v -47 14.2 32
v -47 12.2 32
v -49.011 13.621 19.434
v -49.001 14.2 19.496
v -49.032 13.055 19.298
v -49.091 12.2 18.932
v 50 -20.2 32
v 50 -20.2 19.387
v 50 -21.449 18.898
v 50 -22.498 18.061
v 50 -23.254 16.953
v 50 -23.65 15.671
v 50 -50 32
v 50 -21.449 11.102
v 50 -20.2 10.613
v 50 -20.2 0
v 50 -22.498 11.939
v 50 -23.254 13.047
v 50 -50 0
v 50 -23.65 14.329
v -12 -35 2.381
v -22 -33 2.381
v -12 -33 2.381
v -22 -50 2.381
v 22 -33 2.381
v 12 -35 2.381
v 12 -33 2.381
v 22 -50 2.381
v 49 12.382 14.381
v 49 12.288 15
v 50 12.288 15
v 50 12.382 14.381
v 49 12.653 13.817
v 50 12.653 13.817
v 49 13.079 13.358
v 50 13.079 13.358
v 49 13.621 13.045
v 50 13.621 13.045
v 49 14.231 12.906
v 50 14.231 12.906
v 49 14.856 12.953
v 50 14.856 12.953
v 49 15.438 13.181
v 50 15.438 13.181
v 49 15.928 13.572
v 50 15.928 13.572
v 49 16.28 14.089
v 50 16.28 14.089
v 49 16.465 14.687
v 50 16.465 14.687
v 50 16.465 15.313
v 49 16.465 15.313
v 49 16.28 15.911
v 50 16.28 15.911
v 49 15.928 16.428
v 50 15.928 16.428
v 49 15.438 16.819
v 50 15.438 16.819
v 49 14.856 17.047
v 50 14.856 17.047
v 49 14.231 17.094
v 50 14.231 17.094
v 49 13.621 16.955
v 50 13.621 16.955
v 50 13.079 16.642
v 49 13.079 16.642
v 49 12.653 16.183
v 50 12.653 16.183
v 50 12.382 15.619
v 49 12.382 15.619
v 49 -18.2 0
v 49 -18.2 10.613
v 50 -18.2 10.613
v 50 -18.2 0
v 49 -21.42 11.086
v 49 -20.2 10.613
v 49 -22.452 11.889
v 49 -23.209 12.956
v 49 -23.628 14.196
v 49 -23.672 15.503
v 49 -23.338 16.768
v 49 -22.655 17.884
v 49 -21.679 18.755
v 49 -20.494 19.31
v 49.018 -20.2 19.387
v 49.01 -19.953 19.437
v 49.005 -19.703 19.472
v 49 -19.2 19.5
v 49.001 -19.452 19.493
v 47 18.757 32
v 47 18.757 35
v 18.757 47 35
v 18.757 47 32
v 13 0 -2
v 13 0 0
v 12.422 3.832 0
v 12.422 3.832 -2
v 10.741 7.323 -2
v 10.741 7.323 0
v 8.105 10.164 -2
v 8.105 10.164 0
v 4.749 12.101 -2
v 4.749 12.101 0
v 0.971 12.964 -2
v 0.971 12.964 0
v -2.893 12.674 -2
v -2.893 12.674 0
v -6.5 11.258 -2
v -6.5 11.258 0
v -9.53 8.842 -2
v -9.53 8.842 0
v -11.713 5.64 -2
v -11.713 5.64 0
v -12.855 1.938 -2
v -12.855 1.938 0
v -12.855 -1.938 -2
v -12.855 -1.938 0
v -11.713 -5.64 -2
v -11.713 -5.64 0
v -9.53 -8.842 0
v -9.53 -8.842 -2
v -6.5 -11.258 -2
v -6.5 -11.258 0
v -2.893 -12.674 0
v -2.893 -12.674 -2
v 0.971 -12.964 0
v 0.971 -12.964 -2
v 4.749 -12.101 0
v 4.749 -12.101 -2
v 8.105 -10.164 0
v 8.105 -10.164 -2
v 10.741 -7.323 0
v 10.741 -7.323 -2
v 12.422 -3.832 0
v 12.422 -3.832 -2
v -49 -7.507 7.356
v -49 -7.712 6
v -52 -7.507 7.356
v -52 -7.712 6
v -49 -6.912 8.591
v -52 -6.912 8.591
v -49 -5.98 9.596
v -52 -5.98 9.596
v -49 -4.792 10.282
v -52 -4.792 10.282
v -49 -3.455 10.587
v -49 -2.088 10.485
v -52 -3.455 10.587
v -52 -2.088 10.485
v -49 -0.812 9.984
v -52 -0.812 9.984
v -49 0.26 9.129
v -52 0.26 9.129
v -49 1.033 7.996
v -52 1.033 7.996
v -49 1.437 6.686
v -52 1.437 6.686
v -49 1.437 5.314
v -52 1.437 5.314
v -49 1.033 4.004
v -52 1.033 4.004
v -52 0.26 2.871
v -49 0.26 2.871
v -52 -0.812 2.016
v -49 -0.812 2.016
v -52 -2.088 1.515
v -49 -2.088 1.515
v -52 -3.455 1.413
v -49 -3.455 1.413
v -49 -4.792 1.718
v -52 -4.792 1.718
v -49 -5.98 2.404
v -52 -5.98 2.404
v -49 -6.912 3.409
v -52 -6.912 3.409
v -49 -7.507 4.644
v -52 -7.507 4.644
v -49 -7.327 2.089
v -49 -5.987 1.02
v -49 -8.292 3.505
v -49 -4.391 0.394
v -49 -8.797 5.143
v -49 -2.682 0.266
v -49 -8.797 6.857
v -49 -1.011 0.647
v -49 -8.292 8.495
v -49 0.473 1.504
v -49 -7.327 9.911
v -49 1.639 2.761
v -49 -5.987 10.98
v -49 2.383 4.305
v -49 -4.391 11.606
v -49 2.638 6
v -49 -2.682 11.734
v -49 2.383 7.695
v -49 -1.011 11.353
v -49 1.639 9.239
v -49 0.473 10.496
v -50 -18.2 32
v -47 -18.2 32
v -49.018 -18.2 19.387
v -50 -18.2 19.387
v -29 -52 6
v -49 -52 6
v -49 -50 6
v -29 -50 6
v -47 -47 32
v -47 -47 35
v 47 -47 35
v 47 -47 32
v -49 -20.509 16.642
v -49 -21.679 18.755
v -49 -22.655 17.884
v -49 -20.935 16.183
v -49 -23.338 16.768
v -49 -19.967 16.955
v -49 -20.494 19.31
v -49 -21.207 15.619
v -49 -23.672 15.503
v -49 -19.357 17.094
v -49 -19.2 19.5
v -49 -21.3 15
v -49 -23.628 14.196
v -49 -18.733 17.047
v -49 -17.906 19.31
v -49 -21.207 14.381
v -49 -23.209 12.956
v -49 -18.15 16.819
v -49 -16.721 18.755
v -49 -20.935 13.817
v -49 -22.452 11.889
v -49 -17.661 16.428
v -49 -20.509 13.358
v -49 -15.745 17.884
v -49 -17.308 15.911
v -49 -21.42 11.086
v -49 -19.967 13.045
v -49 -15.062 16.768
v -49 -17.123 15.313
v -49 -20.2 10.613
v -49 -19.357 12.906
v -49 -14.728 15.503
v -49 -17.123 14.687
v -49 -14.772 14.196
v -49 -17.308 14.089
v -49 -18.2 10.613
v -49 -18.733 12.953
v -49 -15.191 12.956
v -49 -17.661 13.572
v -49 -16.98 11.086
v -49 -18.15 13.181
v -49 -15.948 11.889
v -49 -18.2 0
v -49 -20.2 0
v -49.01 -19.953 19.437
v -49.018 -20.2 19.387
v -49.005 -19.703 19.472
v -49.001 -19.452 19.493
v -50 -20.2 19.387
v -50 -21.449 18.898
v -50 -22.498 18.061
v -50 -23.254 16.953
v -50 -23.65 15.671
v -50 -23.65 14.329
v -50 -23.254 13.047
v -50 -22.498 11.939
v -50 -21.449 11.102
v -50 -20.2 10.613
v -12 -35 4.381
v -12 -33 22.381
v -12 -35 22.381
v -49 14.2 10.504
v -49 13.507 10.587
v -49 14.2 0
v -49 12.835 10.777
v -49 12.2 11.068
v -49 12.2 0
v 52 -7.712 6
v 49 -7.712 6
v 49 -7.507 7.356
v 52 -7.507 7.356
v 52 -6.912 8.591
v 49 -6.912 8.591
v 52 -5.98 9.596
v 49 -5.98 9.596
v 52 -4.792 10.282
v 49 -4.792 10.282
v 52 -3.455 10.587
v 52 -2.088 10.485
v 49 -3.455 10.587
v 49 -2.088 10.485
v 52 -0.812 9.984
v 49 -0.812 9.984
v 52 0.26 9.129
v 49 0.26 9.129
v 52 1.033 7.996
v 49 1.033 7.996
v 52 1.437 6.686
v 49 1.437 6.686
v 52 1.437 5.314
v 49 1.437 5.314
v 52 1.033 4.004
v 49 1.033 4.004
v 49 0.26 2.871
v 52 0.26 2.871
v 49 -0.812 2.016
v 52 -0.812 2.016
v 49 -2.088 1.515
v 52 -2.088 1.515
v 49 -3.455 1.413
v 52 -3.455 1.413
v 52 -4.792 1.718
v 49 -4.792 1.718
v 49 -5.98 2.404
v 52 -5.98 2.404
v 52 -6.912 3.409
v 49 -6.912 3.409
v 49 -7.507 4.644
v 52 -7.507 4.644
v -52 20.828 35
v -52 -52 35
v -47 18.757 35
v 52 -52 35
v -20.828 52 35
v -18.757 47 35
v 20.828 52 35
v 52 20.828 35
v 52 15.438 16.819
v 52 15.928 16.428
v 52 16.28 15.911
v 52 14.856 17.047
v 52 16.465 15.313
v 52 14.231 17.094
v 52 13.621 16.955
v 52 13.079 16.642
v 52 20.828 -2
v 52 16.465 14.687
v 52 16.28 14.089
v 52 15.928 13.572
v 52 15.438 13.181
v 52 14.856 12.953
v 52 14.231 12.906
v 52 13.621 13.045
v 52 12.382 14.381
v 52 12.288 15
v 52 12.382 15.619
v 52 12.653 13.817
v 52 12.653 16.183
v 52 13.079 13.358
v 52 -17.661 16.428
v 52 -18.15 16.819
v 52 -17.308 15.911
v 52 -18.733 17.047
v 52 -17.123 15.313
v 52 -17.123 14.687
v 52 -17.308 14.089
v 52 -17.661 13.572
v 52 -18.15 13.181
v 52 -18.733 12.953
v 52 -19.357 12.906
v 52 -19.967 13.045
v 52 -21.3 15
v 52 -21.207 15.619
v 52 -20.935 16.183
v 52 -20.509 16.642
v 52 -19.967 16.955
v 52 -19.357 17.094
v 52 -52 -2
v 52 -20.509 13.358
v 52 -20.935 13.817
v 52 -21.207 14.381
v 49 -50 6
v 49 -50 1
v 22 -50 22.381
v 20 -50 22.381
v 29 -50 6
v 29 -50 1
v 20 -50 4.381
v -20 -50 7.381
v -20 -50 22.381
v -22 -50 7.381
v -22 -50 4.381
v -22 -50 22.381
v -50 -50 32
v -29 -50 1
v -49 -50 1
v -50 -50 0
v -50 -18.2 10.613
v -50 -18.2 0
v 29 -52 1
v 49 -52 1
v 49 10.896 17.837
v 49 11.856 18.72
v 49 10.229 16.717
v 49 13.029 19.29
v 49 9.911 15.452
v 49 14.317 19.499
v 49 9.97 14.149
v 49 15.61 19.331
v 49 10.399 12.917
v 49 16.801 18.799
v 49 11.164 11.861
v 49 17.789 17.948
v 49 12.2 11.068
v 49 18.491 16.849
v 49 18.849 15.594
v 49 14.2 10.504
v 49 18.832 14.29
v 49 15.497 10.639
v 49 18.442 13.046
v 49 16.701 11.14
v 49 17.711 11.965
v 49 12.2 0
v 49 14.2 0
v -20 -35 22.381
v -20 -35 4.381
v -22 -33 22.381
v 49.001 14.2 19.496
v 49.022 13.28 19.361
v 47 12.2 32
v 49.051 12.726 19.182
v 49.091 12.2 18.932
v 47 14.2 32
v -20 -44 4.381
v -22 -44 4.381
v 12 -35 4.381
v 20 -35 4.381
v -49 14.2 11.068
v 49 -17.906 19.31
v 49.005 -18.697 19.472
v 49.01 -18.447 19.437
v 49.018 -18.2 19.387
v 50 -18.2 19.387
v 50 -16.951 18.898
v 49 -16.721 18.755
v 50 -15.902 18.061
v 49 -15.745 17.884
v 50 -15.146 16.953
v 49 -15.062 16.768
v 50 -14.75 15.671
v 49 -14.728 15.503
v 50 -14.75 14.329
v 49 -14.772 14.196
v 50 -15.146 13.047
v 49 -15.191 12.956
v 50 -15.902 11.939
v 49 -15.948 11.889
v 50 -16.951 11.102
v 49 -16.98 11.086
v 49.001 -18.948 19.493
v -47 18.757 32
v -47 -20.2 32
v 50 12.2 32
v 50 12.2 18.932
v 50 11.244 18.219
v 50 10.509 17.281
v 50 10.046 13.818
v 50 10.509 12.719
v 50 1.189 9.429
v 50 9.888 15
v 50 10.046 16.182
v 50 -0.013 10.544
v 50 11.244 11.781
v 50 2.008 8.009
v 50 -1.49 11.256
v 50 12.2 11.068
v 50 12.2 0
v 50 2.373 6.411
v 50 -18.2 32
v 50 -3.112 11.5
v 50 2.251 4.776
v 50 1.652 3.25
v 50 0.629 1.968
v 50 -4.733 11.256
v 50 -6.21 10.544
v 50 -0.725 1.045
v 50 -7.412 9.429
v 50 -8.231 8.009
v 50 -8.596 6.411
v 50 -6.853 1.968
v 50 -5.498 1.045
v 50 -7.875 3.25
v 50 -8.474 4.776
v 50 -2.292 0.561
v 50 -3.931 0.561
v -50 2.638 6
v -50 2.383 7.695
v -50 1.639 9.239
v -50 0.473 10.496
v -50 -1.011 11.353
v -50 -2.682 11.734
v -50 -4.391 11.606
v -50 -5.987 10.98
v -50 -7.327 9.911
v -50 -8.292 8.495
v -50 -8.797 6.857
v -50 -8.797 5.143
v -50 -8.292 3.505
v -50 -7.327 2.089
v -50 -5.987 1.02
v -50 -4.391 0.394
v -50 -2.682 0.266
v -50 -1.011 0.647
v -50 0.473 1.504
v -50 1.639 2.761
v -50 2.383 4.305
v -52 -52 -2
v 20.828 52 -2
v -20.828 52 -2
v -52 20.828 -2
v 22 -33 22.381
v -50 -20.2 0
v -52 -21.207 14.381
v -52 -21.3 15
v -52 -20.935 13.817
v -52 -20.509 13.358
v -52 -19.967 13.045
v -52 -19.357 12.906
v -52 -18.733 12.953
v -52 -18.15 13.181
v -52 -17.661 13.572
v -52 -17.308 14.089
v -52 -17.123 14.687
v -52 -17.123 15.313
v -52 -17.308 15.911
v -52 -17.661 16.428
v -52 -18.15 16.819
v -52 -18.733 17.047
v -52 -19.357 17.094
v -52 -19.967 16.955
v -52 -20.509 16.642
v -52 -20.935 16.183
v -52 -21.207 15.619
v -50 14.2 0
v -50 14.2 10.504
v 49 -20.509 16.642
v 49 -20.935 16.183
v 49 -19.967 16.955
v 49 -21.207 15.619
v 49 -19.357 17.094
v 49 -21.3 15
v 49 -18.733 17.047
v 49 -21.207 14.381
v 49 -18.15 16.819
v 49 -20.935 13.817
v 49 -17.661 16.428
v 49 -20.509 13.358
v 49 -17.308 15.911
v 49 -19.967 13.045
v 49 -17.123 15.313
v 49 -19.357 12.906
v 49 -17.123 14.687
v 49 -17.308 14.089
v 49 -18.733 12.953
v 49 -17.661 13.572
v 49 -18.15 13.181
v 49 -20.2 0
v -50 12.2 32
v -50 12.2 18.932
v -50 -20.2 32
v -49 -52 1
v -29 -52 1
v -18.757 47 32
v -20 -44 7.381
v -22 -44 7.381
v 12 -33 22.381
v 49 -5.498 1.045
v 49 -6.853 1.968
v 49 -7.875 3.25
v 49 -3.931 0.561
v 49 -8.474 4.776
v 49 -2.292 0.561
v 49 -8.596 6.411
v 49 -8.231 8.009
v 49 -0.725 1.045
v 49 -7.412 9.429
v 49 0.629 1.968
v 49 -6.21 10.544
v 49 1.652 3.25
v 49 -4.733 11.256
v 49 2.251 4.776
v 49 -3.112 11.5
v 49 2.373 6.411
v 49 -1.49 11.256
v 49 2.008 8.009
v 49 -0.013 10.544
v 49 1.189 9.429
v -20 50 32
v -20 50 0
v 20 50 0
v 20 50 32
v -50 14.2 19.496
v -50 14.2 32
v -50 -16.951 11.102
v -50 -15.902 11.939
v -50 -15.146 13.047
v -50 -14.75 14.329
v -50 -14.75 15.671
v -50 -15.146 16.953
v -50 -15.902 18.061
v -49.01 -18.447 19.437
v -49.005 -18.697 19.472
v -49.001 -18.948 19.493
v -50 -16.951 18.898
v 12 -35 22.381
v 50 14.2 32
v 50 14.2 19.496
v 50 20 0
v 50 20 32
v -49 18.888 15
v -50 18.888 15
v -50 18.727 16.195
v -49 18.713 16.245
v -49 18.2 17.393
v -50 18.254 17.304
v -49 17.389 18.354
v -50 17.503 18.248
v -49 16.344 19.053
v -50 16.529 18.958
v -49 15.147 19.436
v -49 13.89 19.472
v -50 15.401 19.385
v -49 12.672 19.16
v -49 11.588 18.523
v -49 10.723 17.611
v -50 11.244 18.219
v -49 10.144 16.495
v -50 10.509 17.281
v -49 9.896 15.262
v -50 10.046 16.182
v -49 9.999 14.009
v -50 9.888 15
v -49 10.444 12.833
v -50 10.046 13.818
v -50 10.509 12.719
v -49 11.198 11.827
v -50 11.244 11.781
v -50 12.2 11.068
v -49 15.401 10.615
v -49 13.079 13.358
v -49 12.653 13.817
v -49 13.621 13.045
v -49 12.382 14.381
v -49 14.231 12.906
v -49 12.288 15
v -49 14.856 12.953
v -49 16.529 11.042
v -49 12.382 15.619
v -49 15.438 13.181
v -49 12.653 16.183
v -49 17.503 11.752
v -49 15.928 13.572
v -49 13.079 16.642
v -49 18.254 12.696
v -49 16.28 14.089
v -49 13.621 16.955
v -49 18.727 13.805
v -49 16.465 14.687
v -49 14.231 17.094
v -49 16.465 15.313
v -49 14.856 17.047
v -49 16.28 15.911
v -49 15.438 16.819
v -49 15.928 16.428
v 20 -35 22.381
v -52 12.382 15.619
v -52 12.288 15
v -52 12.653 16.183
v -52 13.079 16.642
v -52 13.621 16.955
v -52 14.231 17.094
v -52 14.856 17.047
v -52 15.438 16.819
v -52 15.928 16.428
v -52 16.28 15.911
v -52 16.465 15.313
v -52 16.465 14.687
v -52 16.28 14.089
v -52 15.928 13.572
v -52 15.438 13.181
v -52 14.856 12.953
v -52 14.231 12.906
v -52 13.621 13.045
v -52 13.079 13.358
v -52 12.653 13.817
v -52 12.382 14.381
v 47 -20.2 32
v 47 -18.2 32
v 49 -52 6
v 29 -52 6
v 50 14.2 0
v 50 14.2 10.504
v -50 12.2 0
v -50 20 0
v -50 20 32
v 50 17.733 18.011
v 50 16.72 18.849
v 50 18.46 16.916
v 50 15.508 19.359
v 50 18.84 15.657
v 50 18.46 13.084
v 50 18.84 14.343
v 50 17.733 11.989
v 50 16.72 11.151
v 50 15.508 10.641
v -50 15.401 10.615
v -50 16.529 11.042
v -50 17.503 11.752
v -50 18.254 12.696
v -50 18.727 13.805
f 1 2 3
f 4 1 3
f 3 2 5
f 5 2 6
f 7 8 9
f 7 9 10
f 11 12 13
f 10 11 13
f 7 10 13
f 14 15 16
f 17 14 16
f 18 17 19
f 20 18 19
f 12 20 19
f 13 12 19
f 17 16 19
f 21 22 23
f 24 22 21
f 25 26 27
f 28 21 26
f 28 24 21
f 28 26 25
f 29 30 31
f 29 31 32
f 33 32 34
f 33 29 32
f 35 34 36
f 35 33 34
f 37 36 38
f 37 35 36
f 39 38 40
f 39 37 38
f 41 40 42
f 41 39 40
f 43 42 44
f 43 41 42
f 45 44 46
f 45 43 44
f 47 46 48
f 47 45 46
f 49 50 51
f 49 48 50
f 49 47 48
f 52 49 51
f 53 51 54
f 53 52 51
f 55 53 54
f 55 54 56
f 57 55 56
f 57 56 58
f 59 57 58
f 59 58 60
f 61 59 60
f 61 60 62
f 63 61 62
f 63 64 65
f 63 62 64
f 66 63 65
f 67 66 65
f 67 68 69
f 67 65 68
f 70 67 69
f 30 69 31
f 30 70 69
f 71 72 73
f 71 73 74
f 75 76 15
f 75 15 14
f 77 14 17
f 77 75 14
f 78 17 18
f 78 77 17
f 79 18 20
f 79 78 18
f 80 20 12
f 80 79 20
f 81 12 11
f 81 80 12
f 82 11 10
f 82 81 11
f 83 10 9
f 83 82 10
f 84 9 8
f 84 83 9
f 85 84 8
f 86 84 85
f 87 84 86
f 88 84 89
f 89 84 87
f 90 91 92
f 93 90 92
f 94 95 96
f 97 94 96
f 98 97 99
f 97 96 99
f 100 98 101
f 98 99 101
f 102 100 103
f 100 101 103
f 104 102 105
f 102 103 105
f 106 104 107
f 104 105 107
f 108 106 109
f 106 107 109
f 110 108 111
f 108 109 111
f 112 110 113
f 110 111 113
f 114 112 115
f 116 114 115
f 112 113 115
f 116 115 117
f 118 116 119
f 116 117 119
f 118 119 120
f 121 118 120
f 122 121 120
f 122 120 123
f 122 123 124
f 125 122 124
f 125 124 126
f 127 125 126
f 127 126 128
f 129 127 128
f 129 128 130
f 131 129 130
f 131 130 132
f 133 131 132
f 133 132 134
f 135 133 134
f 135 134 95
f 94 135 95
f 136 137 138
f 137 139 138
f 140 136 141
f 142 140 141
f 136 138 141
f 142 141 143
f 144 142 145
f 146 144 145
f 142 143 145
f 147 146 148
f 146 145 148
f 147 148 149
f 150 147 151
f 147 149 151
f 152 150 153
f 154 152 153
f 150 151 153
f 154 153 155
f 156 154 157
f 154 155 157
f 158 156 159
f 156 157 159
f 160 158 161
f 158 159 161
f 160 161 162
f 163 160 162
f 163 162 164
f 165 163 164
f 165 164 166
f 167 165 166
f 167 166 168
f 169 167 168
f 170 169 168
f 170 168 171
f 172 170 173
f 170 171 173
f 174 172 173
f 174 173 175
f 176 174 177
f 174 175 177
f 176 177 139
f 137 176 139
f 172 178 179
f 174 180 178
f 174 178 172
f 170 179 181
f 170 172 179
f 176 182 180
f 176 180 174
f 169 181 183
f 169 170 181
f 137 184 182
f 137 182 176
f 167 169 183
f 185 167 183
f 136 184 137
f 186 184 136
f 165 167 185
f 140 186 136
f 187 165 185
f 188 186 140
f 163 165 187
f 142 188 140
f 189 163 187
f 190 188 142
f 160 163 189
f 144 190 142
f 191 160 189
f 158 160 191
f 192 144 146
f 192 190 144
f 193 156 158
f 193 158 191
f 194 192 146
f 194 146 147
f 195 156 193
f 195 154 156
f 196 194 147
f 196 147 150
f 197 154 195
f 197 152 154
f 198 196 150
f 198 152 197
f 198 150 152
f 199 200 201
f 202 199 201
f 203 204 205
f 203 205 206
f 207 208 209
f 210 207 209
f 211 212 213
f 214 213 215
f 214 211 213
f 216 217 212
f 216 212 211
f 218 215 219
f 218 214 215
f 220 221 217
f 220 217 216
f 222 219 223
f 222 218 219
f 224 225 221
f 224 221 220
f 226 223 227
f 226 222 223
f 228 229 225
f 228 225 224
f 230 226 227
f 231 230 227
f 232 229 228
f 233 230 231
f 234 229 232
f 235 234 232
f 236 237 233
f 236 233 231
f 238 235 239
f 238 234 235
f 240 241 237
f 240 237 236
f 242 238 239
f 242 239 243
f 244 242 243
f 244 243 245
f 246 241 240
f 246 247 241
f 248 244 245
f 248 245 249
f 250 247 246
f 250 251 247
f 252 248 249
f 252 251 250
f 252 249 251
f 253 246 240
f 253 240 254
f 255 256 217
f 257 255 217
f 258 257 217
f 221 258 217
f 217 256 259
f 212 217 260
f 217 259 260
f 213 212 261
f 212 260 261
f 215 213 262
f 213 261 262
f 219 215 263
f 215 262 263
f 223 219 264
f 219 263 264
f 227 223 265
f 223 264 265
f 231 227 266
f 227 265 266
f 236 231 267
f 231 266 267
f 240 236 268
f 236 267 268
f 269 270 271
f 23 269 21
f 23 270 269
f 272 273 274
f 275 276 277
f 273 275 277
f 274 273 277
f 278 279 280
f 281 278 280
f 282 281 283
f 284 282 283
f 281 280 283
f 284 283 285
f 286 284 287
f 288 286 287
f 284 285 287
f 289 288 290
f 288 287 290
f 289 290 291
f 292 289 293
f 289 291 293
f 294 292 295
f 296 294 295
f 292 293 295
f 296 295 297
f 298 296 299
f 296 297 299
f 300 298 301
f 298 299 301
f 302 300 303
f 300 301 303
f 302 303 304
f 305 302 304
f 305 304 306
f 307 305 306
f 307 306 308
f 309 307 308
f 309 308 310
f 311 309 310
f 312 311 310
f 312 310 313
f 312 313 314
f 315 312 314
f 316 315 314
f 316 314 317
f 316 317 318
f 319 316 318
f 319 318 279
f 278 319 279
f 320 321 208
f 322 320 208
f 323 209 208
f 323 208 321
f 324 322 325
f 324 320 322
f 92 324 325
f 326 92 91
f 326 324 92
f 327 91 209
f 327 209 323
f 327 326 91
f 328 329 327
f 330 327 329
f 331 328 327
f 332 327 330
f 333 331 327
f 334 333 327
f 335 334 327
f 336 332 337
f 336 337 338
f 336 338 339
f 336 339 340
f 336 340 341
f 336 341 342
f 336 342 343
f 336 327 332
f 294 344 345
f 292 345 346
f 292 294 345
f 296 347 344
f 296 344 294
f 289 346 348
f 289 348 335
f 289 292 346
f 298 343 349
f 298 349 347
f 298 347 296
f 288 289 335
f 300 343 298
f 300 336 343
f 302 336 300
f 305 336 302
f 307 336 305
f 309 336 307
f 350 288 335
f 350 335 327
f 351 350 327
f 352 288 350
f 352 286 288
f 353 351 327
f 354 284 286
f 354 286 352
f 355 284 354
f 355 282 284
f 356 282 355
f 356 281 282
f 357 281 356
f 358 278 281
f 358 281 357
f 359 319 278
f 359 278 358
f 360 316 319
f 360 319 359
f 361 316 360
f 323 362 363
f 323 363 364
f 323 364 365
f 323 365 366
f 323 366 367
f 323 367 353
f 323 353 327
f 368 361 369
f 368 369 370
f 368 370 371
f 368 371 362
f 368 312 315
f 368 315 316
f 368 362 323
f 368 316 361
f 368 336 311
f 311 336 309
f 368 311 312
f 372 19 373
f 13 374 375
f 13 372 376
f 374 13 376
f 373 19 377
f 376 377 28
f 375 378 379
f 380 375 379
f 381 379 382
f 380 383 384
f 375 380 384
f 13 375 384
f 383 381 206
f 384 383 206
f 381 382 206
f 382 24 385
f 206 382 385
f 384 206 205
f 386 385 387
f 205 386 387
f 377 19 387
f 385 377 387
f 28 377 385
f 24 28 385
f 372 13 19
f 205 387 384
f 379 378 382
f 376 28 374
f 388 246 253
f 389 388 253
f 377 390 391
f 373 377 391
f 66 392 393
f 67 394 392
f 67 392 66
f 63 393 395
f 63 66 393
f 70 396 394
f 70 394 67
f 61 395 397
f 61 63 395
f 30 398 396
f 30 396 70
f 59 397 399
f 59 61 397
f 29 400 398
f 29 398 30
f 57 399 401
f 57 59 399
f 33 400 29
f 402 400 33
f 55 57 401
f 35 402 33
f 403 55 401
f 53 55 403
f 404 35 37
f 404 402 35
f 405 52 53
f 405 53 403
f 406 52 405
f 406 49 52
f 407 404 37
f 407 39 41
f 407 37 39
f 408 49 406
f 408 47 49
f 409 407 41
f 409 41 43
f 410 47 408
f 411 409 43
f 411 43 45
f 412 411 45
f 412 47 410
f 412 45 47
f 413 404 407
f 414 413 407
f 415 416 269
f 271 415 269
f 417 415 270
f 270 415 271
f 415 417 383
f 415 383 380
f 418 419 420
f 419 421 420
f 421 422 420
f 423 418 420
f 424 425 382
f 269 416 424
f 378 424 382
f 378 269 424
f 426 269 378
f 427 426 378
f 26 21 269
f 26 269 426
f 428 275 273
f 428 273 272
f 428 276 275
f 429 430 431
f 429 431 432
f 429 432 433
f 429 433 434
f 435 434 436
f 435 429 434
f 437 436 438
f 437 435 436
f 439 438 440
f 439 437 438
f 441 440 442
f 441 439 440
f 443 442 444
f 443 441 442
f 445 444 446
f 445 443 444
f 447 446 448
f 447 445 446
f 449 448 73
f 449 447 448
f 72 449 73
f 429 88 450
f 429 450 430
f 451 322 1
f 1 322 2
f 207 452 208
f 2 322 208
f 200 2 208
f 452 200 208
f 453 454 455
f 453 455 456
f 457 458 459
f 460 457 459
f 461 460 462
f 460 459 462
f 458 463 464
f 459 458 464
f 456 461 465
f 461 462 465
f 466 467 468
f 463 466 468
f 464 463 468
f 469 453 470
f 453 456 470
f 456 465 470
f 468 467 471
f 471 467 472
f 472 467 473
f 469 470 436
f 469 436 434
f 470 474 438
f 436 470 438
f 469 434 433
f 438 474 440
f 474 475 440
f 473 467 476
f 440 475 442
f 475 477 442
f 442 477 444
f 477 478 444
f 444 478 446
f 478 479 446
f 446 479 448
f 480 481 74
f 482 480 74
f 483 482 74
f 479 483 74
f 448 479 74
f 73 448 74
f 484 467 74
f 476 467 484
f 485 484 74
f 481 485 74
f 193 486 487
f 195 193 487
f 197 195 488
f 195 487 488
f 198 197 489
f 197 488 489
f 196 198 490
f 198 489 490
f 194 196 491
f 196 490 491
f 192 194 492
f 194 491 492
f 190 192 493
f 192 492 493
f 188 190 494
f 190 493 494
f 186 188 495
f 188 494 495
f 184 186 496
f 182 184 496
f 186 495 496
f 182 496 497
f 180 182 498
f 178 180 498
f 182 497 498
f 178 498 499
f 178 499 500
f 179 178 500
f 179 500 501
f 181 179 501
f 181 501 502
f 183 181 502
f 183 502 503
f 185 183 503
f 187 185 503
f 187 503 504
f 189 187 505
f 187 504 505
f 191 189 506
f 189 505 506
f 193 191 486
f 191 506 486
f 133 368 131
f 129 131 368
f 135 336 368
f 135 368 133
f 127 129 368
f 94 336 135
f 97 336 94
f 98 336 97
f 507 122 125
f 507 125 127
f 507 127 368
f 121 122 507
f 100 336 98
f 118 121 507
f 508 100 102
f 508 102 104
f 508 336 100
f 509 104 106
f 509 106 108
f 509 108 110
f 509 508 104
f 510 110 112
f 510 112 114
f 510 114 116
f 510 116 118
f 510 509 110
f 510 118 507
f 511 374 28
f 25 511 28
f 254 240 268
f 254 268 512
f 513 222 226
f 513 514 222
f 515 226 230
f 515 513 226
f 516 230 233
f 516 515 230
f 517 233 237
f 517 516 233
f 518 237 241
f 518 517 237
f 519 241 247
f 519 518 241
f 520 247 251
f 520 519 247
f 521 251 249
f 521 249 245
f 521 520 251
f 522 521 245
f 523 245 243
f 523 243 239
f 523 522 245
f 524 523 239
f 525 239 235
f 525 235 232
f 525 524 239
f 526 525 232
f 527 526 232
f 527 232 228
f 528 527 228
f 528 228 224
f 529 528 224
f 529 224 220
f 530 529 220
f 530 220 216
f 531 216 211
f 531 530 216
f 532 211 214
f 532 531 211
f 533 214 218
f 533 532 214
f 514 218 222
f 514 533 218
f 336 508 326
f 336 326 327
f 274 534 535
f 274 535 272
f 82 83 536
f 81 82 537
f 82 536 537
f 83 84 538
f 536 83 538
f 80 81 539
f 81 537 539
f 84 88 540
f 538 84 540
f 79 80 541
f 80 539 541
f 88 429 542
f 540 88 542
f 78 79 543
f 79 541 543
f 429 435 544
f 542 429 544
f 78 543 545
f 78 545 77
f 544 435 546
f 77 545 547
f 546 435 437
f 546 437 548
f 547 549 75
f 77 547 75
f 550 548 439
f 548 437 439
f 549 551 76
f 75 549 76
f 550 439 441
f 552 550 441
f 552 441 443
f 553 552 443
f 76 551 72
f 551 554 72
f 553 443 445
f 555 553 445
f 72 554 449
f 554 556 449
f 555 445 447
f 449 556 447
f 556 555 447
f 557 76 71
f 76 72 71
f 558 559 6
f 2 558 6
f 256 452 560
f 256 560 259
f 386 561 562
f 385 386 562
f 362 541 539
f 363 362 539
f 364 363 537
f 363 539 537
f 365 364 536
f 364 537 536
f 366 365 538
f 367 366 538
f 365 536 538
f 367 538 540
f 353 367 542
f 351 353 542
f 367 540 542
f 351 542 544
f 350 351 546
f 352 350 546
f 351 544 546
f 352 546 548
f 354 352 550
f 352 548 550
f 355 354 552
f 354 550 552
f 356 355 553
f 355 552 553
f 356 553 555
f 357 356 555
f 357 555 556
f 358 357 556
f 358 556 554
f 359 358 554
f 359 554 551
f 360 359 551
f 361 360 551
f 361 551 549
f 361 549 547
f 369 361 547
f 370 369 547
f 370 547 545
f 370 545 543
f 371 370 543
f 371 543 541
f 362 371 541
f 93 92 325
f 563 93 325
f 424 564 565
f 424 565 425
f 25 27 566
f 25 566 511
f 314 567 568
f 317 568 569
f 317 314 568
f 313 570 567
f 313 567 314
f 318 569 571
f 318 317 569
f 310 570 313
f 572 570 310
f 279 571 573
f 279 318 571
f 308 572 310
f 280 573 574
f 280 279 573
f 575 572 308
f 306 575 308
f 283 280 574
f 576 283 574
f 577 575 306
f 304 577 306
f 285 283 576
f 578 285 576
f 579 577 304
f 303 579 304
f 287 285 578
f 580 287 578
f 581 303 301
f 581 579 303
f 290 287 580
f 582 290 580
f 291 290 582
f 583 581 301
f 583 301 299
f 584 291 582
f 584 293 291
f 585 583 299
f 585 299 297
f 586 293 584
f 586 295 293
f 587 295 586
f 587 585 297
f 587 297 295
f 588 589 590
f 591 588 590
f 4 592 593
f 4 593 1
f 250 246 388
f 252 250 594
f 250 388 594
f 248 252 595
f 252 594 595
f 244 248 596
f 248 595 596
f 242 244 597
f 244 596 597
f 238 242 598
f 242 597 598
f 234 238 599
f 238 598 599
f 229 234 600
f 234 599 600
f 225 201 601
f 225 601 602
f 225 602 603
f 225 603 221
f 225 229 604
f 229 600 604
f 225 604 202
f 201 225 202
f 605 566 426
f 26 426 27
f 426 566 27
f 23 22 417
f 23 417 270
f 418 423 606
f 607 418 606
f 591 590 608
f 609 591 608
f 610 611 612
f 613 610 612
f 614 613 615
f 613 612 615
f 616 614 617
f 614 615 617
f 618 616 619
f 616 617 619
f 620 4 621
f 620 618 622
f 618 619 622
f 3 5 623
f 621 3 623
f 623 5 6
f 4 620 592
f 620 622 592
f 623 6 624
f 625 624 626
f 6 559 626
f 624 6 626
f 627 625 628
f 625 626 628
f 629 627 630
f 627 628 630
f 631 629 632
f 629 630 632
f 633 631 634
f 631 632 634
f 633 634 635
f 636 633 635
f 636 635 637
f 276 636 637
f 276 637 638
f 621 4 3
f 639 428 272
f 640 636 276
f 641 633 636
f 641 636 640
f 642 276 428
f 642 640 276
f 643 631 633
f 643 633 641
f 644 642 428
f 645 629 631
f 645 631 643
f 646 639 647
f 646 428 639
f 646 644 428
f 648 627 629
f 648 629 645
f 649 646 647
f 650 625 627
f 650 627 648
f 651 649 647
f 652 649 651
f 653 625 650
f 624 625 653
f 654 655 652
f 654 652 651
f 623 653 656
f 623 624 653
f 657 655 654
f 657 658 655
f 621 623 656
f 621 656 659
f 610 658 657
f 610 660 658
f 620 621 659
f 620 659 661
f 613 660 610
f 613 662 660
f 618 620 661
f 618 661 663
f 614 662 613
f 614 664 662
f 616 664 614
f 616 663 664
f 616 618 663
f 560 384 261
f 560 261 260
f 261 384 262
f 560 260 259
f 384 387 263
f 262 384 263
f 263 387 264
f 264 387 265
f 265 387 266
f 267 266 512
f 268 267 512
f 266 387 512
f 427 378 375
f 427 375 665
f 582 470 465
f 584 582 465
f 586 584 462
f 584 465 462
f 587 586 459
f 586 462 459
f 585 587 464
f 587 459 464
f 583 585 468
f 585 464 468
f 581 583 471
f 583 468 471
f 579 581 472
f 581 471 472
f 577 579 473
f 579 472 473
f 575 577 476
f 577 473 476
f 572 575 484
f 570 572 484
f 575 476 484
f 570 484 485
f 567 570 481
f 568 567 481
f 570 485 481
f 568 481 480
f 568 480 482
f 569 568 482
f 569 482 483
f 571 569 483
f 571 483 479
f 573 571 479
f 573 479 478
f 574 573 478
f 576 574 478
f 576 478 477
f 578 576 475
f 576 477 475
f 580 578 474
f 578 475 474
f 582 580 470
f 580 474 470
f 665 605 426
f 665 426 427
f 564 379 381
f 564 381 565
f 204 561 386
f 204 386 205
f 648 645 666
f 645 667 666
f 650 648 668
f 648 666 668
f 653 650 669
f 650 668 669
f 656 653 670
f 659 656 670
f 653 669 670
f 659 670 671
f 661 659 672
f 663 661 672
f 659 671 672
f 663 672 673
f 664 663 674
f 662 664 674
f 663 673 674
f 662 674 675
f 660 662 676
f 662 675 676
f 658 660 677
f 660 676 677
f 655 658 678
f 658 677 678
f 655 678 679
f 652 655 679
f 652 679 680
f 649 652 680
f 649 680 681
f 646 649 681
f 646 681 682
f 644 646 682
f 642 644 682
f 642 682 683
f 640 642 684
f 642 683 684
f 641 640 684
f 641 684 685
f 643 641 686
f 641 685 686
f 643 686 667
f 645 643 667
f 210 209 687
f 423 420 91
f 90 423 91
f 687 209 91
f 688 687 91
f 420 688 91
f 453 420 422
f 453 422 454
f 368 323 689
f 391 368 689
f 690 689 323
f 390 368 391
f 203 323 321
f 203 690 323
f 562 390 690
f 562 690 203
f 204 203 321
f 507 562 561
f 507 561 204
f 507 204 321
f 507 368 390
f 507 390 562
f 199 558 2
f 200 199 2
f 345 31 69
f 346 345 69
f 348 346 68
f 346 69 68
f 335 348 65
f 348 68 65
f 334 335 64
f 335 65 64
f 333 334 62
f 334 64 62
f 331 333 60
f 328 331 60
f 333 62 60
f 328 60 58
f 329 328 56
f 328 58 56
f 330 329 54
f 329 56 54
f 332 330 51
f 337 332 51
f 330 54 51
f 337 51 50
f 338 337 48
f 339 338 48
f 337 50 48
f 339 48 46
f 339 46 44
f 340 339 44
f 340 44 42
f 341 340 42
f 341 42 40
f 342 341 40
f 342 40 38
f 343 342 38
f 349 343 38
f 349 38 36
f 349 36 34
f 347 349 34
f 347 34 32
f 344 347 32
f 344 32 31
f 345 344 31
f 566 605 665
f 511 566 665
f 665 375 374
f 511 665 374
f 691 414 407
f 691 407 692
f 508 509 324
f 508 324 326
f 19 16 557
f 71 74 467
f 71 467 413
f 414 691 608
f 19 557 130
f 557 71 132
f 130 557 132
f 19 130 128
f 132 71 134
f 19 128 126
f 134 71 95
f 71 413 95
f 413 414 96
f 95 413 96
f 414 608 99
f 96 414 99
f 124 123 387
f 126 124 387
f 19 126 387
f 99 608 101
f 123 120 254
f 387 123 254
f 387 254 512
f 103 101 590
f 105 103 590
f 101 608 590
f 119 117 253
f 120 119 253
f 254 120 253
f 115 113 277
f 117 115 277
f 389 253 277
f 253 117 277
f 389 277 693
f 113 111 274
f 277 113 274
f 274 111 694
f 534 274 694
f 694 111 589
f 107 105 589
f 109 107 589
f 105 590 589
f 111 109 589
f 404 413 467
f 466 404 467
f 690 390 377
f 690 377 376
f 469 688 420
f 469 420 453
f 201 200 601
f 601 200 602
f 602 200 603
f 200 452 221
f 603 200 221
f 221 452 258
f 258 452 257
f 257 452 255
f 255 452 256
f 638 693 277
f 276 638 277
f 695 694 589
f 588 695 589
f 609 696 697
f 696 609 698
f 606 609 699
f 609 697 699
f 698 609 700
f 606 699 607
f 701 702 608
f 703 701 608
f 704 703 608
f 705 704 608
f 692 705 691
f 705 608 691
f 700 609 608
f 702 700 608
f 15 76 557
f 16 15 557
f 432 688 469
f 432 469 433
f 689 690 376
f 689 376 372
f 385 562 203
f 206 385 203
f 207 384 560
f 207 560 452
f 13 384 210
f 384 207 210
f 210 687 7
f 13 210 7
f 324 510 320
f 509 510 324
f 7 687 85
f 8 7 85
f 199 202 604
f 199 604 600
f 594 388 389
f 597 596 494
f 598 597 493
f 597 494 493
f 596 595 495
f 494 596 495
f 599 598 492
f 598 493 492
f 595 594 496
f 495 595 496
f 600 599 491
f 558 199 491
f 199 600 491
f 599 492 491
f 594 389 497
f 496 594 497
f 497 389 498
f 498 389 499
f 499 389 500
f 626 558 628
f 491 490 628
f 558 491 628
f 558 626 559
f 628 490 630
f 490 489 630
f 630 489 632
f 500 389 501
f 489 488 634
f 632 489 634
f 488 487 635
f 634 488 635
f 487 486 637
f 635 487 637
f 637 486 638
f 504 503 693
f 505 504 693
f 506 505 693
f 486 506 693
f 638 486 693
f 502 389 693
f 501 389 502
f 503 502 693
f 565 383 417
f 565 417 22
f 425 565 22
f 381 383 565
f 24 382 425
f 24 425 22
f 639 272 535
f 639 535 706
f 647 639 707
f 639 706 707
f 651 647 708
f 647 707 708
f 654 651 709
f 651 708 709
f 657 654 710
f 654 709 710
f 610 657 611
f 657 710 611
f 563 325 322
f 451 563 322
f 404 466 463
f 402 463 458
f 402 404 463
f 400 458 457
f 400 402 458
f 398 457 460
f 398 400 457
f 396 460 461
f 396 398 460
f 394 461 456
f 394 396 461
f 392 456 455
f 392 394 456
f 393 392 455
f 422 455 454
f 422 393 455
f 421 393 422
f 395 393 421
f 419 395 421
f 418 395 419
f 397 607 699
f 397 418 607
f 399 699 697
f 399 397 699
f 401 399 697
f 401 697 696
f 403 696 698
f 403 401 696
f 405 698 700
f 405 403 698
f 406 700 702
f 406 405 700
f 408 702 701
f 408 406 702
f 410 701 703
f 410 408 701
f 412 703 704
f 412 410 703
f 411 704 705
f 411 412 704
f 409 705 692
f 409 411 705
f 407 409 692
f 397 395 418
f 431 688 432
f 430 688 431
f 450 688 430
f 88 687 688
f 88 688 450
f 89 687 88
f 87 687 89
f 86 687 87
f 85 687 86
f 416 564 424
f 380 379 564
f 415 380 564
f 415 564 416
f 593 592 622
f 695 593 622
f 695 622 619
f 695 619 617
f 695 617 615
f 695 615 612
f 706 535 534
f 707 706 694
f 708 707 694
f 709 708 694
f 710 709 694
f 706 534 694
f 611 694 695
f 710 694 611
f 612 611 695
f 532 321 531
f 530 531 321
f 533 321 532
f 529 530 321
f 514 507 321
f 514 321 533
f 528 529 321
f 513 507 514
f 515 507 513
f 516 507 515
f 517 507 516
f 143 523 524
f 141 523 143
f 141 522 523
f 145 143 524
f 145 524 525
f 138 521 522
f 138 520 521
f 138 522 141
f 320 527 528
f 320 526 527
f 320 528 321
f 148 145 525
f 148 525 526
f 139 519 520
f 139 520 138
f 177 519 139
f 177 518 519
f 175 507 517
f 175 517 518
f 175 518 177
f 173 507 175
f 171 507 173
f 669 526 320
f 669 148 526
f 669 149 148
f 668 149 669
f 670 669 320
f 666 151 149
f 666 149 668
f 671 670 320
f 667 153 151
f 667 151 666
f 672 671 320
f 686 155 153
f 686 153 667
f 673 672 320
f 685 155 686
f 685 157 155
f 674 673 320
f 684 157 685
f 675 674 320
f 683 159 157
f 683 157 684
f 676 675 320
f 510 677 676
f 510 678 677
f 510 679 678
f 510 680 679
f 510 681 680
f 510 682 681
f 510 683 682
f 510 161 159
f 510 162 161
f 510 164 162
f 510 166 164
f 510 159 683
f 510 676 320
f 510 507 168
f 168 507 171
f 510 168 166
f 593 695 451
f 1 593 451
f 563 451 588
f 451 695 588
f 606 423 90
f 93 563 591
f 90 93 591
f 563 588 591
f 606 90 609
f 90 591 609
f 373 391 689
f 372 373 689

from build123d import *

# Parameters (mm, degrees)
BOSS_EXTRU_1_DEPTH       = 35
COQUE3_T                 = 2
ESQUISSE3_R              = 13
ENL_V_MAT_EXTRU_1_DEPTH  = 82.443231763
ESQUISSE5_W              = 20
ESQUISSE5_H              = 5
ENL_V_MAT_EXTRU_3_DEPTH  = 2
ESQUISSE6_R              = 4.6
ENL_V_MAT_EXTRU_4_DEPTH  = 122.428991596
ESQUISSE7_R              = 2.1
ENL_V_MAT_EXTRU_5_DEPTH  = 122.428991596
ESQUISSE8_W              = 44
ESQUISSE8_H              = 20
BOSS_EXTRU_2_DEPTH       = 17
ESQUISSE9_W              = 40
ESQUISSE9_H              = 15
ENL_V_MAT_EXTRU_7_DEPTH  = 18
ESQUISSE10_W             = 3
ESQUISSE10_H             = 6
ENL_V_MAT_EXTRU_8_DEPTH  = 5
BOSS_EXTRU_4_DEPTH       = 3
ESQUISSE22_R             = 4.5
BOSS_EXTRU_7_DEPTH       = 1
ENL_V_START              = -3
ESQUISSE24_R             = 2.1
ENL_V_MAT_EXTRU_12_DEPTH = 3
ESQUISSE20_R             = 4.5
BOSS_EXTRU_8_DEPTH       = 1
ESQUISSE25_R             = 2.1
ENL_V_MAT_EXTRU_13_DEPTH = 3
BOSS_EXTRU_9_START       = 1
ESQUISSE26_R             = 4.5
BOSS_EXTRU_9_DEPTH       = 1
ESQUISSE27_R             = 2.1
ENL_V_MAT_EXTRU_14_DEPTH = 3
BOSS_EXTRU_10_START      = 1
ESQUISSE28_R             = 4.5
BOSS_EXTRU_10_DEPTH      = 1
ESQUISSE29_R             = 2.1
ENL_V_MAT_EXTRU_15_DEPTH = 3
ESQUISSE34_R             = 5.75
BOSS_EXTRU_16_DEPTH      = 1
ESQUISSE35_R             = 4.6
ENL_V_MAT_EXTRU_19_DEPTH = 1
ESQUISSE36_R             = 5.5
BOSS_EXTRU_17_DEPTH      = 1
ESQUISSE37_R             = 4.6
ENL_V_MAT_EXTRU_20_DEPTH = 1
NERVURE3_REACH           = 96.86
ESQUISSE38_WALL_W        = 204.379203954
ESQUISSE38_WALL_H        = 2
NERVURE4_REACH           = 120.87
ESQUISSE39_WALLS_W       = 252.639353074
ESQUISSE39_WALLS_H       = 2
ESQUISSE40_W             = 24
ESQUISSE40_H             = 20
ENL_V_MAT_EXTRU_21_DEPTH = 2
SYM_TRIE2_START          = 12.2
SYM_TRIE2_OUTLINE_W      = 1
SYM_TRIE2_OUTLINE_H      = 11.067979308
SYM_TRIE2_DEPTH          = 2


with BuildPart() as part:
    # Esquisse1 → Boss.-Extru.1 (new body)
    with BuildSketch(Plane.XY):
        Polygon((-50, 20), (-20, 50), (20, 50), (50, 20), (50, -50), (-50, -50), align=None)
    extrude(amount=BOSS_EXTRU_1_DEPTH)

    # Coque3
    coque3_openings = [part.faces().sort_by_distance(p)[0] for p in [
        (0, -3.956043956, 35),
    ]]
    offset(amount=COQUE3_T, openings=coque3_openings, kind=Kind.INTERSECTION)

    # Esquisse3 → Enlèv. mat.-Extru.1 (cut, through all)
    with BuildSketch(Plane.XY):
        Circle(ESQUISSE3_R)
    extrude(amount=-ENL_V_MAT_EXTRU_1_DEPTH, mode=Mode.SUBTRACT)

    # Esquisse5 → Enlèv. mat.-Extru.3 (cut)
    with BuildSketch(Plane.XZ.offset(52)):
        with Locations((39, 3.5)):
            Rectangle(ESQUISSE5_W, ESQUISSE5_H)
        with Locations((-39, 3.5)):
            Rectangle(ESQUISSE5_W, ESQUISSE5_H)
    extrude(amount=-ENL_V_MAT_EXTRU_3_DEPTH, mode=Mode.SUBTRACT)

    # Esquisse6 → Enlèv. mat.-Extru.4 (cut, through all)
    with BuildSketch(Plane.ZY.offset(52)):
        with Locations(Location((6, -3.111572875, 0), (0, 0, 270))):
            Circle(ESQUISSE6_R)
    extrude(amount=-ENL_V_MAT_EXTRU_4_DEPTH, mode=Mode.SUBTRACT)

    # Esquisse7 → Enlèv. mat.-Extru.5 (cut, through all)
    with BuildSketch(Plane.ZY.offset(52)):
        with Locations(Location((15, 14.388427125, 0), (0, 0, 270))):
            Circle(ESQUISSE7_R)
        with Locations(Location((15, -19.2, 0), (0, 0, 270))):
            Circle(ESQUISSE7_R)
    extrude(amount=-ENL_V_MAT_EXTRU_5_DEPTH, mode=Mode.SUBTRACT)

    # Esquisse8 → Boss.-Extru.2 (add)
    with BuildSketch(Plane(origin=(0, -50, 0), x_dir=(1, 0, 0), z_dir=(0, 1, 0))):
        with Locations((0, -12.381067223)):
            Rectangle(ESQUISSE8_W, ESQUISSE8_H)
    extrude(amount=BOSS_EXTRU_2_DEPTH)

    # Esquisse9 → Enlèv. mat.-Extru.7 (cut)
    with BuildSketch(Plane.XY.offset(22.381067223)):
        with Locations((0, -42.5)):
            Rectangle(ESQUISSE9_W, ESQUISSE9_H)
    extrude(amount=-ENL_V_MAT_EXTRU_7_DEPTH, mode=Mode.SUBTRACT)

    # Esquisse10 → Enlèv. mat.-Extru.8 (cut)
    with BuildSketch(Plane(origin=(-20, 0, 0), x_dir=(0, 0, -1), z_dir=(1, 0, 0))):
        with Locations((-5.881067223, -47)):
            Rectangle(ESQUISSE10_W, ESQUISSE10_H)
    extrude(amount=-ENL_V_MAT_EXTRU_8_DEPTH, mode=Mode.SUBTRACT)

    # Esquisse17 → Boss.-Extru.4 (add)
    with BuildSketch(Plane.XY.offset(35)):
        Polygon((50, -50), (50, 20), (20, 50), (-20, 50), (-50, 20), (-50, -50), align=None)
        Polygon((-47, -47), (47, -47), (47, 18.757359313), (18.757359313, 47), (-18.757359313, 47), (-47, 18.757359313), align=None, mode=Mode.SUBTRACT)
    extrude(amount=-BOSS_EXTRU_4_DEPTH)

    # Esquisse22 → Boss.-Extru.7 (add)
    with BuildSketch(Plane(origin=(-50, 0, 0), x_dir=(0, 0, -1), z_dir=(1, 0, 0))):
        with Locations(Location((-15, -19.2, 0), (0, 0, 90))):
            Circle(ESQUISSE22_R)
    extrude(amount=BOSS_EXTRU_7_DEPTH)

    # Esquisse24 → Enlèv. mat.-Extru.12 (cut)
    with BuildSketch(Plane(origin=(-49, 0, 0), x_dir=(0, 0, -1), z_dir=(1, 0, 0)).offset(ENL_V_START)):
        with Locations(Location((-15, -19.2, 0), (0, 0, 270))):
            Circle(ESQUISSE24_R)
    extrude(amount=ENL_V_MAT_EXTRU_12_DEPTH, mode=Mode.SUBTRACT)

    # Esquisse20 → Boss.-Extru.8 (add)
    with BuildSketch(Plane(origin=(-50, 0, 0), x_dir=(0, 0, -1), z_dir=(1, 0, 0))):
        with Locations(Location((-15, 14.388427125, 0), (0, 0, 90))):
            Circle(ESQUISSE20_R)
    extrude(amount=BOSS_EXTRU_8_DEPTH)

    # Esquisse25 → Enlèv. mat.-Extru.13 (cut)
    with BuildSketch(Plane.ZY.offset(50)):
        with Locations(Location((15, 14.388427125, 0), (0, 0, 270))):
            Circle(ESQUISSE25_R)
    extrude(amount=-ENL_V_MAT_EXTRU_13_DEPTH, mode=Mode.SUBTRACT)

    # Esquisse26 → Boss.-Extru.9 (add)
    with BuildSketch(Plane.ZY.offset(-50).offset(BOSS_EXTRU_9_START)):
        with Locations(Location((15, 14.388427125, 0), (0, 0, 90))):
            Circle(ESQUISSE26_R)
    extrude(amount=-BOSS_EXTRU_9_DEPTH)

    # Esquisse27 → Enlèv. mat.-Extru.14 (cut)
    with BuildSketch(Plane(origin=(50, 0, 0), x_dir=(0, 0, -1), z_dir=(1, 0, 0)).offset(ENL_V_START)):
        with Locations(Location((-15, 14.388427125, 0), (0, 0, 270))):
            Circle(ESQUISSE27_R)
    extrude(amount=ENL_V_MAT_EXTRU_14_DEPTH, mode=Mode.SUBTRACT)

    # Esquisse28 → Boss.-Extru.10 (add)
    with BuildSketch(Plane.ZY.offset(-50).offset(BOSS_EXTRU_10_START)):
        with Locations(Location((15, -19.2, 0), (0, 0, 90))):
            Circle(ESQUISSE28_R)
    extrude(amount=-BOSS_EXTRU_10_DEPTH)

    # Esquisse29 → Enlèv. mat.-Extru.15 (cut)
    with BuildSketch(Plane.ZY.offset(-49)):
        with Locations(Location((15, -19.2, 0), (0, 0, 270))):
            Circle(ESQUISSE29_R)
    extrude(amount=-ENL_V_MAT_EXTRU_15_DEPTH, mode=Mode.SUBTRACT)

    # Esquisse34 → Boss.-Extru.16 (add)
    with BuildSketch(Plane(origin=(-50, 0, 0), x_dir=(0, 0, -1), z_dir=(1, 0, 0))):
        with Locations(Location((-6, -3.111572875, 0), (0, 0, 90))):
            Circle(ESQUISSE34_R)
    extrude(amount=BOSS_EXTRU_16_DEPTH)

    # Esquisse35 → Enlèv. mat.-Extru.19 (cut)
    with BuildSketch(Plane.ZY.offset(50)):
        with Locations(Location((6, -3.111572875, 0), (0, 0, 270))):
            Circle(ESQUISSE35_R)
    extrude(amount=-ENL_V_MAT_EXTRU_19_DEPTH, mode=Mode.SUBTRACT)

    # Esquisse36 → Boss.-Extru.17 (add)
    with BuildSketch(Plane.ZY.offset(-50)):
        with Locations((6, -3.111572875)):
            Circle(ESQUISSE36_R)
    extrude(amount=BOSS_EXTRU_17_DEPTH)

    # Esquisse37 → Enlèv. mat.-Extru.20 (cut)
    with BuildSketch(Plane.ZY.offset(-49)):
        with Locations(Location((6, -3.111572875, 0), (0, 0, 270))):
            Circle(ESQUISSE37_R)
    extrude(amount=-ENL_V_MAT_EXTRU_20_DEPTH, mode=Mode.SUBTRACT)

    # Esquisse38 wall → Nervure3 (add, up to next)
    with BuildSketch(Plane(origin=(-48, -19.2, 25.75), x_dir=(-0.157990501107, 0, -0.987440631917), z_dir=(-0.987440631917, 0, 0.157990501107)), mode=Mode.PRIVATE) as nervure3_sk1:
        Rectangle(ESQUISSE38_WALL_W, ESQUISSE38_WALL_H)
    nervure3_tool1 = extrude(nervure3_sk1.sketch, amount=NERVURE3_REACH, mode=Mode.PRIVATE) - part.part
    nervure3 = nervure3_tool1.solids().sort_by_distance((-48, -19.2, 25.75))[0]
    add(nervure3)

    # Esquisse39 walls → Nervure4 (add, up to next)
    with BuildSketch(Plane(origin=(-49, 0, 0), x_dir=(0, 0, -1), z_dir=(1, 0, 0)), mode=Mode.PRIVATE) as nervure4_sk1:
        with Locations((-6.45, -19.2)):
            Rectangle(ESQUISSE39_WALLS_W, ESQUISSE39_WALLS_H)
    nervure4_tool1 = extrude(nervure4_sk1.sketch, amount=-NERVURE4_REACH, mode=Mode.PRIVATE) - part.part
    nervure4 = nervure4_tool1.solids().sort_by_distance((-49, -19.2, 6.45))[0]
    add(nervure4)

    # Esquisse40 → Enlèv. mat.-Extru.21 (cut)
    with BuildSketch(Plane(origin=(0, -33, 0), x_dir=(1, 0, 0), z_dir=(0, 1, 0))):
        with Locations((0, -12.381067223)):
            Rectangle(ESQUISSE40_W, ESQUISSE40_H)
    extrude(amount=-ENL_V_MAT_EXTRU_21_DEPTH, mode=Mode.SUBTRACT)

    # Symétrie1: Nervure3, Nervure4 across plane
    add(nervure3.mirror(Plane(origin=(0, 0, 0), x_dir=(0, 0, 1), z_dir=(1, 0, 0))))
    add(nervure4.mirror(Plane(origin=(0, 0, 0), x_dir=(0, 0, 1), z_dir=(1, 0, 0))))

    # Symétrie2: read off the stored shape, not the designer's step
    # Symétrie2 outline → Symétrie2 (add)
    with BuildSketch(Plane(origin=(0, 0, 0), x_dir=(1, 0, 0), z_dir=(0, 1, 0)).offset(SYM_TRIE2_START)):
        Polygon((47, -32), (50, -32), (50, -18.932020692), (49.090876689, -18.932020692), align=None)
        with Locations((49.5, -5.533989654)):
            Rectangle(SYM_TRIE2_OUTLINE_W, SYM_TRIE2_OUTLINE_H)
        Polygon((-49.090876689, -18.932020692), (-50, -18.932020692), (-50, -32), (-47, -32), align=None)
        with Locations((-49.5, -5.533989654)):
            Rectangle(SYM_TRIE2_OUTLINE_W, SYM_TRIE2_OUTLINE_H)
    extrude(amount=SYM_TRIE2_DEPTH)


solid = part.part
